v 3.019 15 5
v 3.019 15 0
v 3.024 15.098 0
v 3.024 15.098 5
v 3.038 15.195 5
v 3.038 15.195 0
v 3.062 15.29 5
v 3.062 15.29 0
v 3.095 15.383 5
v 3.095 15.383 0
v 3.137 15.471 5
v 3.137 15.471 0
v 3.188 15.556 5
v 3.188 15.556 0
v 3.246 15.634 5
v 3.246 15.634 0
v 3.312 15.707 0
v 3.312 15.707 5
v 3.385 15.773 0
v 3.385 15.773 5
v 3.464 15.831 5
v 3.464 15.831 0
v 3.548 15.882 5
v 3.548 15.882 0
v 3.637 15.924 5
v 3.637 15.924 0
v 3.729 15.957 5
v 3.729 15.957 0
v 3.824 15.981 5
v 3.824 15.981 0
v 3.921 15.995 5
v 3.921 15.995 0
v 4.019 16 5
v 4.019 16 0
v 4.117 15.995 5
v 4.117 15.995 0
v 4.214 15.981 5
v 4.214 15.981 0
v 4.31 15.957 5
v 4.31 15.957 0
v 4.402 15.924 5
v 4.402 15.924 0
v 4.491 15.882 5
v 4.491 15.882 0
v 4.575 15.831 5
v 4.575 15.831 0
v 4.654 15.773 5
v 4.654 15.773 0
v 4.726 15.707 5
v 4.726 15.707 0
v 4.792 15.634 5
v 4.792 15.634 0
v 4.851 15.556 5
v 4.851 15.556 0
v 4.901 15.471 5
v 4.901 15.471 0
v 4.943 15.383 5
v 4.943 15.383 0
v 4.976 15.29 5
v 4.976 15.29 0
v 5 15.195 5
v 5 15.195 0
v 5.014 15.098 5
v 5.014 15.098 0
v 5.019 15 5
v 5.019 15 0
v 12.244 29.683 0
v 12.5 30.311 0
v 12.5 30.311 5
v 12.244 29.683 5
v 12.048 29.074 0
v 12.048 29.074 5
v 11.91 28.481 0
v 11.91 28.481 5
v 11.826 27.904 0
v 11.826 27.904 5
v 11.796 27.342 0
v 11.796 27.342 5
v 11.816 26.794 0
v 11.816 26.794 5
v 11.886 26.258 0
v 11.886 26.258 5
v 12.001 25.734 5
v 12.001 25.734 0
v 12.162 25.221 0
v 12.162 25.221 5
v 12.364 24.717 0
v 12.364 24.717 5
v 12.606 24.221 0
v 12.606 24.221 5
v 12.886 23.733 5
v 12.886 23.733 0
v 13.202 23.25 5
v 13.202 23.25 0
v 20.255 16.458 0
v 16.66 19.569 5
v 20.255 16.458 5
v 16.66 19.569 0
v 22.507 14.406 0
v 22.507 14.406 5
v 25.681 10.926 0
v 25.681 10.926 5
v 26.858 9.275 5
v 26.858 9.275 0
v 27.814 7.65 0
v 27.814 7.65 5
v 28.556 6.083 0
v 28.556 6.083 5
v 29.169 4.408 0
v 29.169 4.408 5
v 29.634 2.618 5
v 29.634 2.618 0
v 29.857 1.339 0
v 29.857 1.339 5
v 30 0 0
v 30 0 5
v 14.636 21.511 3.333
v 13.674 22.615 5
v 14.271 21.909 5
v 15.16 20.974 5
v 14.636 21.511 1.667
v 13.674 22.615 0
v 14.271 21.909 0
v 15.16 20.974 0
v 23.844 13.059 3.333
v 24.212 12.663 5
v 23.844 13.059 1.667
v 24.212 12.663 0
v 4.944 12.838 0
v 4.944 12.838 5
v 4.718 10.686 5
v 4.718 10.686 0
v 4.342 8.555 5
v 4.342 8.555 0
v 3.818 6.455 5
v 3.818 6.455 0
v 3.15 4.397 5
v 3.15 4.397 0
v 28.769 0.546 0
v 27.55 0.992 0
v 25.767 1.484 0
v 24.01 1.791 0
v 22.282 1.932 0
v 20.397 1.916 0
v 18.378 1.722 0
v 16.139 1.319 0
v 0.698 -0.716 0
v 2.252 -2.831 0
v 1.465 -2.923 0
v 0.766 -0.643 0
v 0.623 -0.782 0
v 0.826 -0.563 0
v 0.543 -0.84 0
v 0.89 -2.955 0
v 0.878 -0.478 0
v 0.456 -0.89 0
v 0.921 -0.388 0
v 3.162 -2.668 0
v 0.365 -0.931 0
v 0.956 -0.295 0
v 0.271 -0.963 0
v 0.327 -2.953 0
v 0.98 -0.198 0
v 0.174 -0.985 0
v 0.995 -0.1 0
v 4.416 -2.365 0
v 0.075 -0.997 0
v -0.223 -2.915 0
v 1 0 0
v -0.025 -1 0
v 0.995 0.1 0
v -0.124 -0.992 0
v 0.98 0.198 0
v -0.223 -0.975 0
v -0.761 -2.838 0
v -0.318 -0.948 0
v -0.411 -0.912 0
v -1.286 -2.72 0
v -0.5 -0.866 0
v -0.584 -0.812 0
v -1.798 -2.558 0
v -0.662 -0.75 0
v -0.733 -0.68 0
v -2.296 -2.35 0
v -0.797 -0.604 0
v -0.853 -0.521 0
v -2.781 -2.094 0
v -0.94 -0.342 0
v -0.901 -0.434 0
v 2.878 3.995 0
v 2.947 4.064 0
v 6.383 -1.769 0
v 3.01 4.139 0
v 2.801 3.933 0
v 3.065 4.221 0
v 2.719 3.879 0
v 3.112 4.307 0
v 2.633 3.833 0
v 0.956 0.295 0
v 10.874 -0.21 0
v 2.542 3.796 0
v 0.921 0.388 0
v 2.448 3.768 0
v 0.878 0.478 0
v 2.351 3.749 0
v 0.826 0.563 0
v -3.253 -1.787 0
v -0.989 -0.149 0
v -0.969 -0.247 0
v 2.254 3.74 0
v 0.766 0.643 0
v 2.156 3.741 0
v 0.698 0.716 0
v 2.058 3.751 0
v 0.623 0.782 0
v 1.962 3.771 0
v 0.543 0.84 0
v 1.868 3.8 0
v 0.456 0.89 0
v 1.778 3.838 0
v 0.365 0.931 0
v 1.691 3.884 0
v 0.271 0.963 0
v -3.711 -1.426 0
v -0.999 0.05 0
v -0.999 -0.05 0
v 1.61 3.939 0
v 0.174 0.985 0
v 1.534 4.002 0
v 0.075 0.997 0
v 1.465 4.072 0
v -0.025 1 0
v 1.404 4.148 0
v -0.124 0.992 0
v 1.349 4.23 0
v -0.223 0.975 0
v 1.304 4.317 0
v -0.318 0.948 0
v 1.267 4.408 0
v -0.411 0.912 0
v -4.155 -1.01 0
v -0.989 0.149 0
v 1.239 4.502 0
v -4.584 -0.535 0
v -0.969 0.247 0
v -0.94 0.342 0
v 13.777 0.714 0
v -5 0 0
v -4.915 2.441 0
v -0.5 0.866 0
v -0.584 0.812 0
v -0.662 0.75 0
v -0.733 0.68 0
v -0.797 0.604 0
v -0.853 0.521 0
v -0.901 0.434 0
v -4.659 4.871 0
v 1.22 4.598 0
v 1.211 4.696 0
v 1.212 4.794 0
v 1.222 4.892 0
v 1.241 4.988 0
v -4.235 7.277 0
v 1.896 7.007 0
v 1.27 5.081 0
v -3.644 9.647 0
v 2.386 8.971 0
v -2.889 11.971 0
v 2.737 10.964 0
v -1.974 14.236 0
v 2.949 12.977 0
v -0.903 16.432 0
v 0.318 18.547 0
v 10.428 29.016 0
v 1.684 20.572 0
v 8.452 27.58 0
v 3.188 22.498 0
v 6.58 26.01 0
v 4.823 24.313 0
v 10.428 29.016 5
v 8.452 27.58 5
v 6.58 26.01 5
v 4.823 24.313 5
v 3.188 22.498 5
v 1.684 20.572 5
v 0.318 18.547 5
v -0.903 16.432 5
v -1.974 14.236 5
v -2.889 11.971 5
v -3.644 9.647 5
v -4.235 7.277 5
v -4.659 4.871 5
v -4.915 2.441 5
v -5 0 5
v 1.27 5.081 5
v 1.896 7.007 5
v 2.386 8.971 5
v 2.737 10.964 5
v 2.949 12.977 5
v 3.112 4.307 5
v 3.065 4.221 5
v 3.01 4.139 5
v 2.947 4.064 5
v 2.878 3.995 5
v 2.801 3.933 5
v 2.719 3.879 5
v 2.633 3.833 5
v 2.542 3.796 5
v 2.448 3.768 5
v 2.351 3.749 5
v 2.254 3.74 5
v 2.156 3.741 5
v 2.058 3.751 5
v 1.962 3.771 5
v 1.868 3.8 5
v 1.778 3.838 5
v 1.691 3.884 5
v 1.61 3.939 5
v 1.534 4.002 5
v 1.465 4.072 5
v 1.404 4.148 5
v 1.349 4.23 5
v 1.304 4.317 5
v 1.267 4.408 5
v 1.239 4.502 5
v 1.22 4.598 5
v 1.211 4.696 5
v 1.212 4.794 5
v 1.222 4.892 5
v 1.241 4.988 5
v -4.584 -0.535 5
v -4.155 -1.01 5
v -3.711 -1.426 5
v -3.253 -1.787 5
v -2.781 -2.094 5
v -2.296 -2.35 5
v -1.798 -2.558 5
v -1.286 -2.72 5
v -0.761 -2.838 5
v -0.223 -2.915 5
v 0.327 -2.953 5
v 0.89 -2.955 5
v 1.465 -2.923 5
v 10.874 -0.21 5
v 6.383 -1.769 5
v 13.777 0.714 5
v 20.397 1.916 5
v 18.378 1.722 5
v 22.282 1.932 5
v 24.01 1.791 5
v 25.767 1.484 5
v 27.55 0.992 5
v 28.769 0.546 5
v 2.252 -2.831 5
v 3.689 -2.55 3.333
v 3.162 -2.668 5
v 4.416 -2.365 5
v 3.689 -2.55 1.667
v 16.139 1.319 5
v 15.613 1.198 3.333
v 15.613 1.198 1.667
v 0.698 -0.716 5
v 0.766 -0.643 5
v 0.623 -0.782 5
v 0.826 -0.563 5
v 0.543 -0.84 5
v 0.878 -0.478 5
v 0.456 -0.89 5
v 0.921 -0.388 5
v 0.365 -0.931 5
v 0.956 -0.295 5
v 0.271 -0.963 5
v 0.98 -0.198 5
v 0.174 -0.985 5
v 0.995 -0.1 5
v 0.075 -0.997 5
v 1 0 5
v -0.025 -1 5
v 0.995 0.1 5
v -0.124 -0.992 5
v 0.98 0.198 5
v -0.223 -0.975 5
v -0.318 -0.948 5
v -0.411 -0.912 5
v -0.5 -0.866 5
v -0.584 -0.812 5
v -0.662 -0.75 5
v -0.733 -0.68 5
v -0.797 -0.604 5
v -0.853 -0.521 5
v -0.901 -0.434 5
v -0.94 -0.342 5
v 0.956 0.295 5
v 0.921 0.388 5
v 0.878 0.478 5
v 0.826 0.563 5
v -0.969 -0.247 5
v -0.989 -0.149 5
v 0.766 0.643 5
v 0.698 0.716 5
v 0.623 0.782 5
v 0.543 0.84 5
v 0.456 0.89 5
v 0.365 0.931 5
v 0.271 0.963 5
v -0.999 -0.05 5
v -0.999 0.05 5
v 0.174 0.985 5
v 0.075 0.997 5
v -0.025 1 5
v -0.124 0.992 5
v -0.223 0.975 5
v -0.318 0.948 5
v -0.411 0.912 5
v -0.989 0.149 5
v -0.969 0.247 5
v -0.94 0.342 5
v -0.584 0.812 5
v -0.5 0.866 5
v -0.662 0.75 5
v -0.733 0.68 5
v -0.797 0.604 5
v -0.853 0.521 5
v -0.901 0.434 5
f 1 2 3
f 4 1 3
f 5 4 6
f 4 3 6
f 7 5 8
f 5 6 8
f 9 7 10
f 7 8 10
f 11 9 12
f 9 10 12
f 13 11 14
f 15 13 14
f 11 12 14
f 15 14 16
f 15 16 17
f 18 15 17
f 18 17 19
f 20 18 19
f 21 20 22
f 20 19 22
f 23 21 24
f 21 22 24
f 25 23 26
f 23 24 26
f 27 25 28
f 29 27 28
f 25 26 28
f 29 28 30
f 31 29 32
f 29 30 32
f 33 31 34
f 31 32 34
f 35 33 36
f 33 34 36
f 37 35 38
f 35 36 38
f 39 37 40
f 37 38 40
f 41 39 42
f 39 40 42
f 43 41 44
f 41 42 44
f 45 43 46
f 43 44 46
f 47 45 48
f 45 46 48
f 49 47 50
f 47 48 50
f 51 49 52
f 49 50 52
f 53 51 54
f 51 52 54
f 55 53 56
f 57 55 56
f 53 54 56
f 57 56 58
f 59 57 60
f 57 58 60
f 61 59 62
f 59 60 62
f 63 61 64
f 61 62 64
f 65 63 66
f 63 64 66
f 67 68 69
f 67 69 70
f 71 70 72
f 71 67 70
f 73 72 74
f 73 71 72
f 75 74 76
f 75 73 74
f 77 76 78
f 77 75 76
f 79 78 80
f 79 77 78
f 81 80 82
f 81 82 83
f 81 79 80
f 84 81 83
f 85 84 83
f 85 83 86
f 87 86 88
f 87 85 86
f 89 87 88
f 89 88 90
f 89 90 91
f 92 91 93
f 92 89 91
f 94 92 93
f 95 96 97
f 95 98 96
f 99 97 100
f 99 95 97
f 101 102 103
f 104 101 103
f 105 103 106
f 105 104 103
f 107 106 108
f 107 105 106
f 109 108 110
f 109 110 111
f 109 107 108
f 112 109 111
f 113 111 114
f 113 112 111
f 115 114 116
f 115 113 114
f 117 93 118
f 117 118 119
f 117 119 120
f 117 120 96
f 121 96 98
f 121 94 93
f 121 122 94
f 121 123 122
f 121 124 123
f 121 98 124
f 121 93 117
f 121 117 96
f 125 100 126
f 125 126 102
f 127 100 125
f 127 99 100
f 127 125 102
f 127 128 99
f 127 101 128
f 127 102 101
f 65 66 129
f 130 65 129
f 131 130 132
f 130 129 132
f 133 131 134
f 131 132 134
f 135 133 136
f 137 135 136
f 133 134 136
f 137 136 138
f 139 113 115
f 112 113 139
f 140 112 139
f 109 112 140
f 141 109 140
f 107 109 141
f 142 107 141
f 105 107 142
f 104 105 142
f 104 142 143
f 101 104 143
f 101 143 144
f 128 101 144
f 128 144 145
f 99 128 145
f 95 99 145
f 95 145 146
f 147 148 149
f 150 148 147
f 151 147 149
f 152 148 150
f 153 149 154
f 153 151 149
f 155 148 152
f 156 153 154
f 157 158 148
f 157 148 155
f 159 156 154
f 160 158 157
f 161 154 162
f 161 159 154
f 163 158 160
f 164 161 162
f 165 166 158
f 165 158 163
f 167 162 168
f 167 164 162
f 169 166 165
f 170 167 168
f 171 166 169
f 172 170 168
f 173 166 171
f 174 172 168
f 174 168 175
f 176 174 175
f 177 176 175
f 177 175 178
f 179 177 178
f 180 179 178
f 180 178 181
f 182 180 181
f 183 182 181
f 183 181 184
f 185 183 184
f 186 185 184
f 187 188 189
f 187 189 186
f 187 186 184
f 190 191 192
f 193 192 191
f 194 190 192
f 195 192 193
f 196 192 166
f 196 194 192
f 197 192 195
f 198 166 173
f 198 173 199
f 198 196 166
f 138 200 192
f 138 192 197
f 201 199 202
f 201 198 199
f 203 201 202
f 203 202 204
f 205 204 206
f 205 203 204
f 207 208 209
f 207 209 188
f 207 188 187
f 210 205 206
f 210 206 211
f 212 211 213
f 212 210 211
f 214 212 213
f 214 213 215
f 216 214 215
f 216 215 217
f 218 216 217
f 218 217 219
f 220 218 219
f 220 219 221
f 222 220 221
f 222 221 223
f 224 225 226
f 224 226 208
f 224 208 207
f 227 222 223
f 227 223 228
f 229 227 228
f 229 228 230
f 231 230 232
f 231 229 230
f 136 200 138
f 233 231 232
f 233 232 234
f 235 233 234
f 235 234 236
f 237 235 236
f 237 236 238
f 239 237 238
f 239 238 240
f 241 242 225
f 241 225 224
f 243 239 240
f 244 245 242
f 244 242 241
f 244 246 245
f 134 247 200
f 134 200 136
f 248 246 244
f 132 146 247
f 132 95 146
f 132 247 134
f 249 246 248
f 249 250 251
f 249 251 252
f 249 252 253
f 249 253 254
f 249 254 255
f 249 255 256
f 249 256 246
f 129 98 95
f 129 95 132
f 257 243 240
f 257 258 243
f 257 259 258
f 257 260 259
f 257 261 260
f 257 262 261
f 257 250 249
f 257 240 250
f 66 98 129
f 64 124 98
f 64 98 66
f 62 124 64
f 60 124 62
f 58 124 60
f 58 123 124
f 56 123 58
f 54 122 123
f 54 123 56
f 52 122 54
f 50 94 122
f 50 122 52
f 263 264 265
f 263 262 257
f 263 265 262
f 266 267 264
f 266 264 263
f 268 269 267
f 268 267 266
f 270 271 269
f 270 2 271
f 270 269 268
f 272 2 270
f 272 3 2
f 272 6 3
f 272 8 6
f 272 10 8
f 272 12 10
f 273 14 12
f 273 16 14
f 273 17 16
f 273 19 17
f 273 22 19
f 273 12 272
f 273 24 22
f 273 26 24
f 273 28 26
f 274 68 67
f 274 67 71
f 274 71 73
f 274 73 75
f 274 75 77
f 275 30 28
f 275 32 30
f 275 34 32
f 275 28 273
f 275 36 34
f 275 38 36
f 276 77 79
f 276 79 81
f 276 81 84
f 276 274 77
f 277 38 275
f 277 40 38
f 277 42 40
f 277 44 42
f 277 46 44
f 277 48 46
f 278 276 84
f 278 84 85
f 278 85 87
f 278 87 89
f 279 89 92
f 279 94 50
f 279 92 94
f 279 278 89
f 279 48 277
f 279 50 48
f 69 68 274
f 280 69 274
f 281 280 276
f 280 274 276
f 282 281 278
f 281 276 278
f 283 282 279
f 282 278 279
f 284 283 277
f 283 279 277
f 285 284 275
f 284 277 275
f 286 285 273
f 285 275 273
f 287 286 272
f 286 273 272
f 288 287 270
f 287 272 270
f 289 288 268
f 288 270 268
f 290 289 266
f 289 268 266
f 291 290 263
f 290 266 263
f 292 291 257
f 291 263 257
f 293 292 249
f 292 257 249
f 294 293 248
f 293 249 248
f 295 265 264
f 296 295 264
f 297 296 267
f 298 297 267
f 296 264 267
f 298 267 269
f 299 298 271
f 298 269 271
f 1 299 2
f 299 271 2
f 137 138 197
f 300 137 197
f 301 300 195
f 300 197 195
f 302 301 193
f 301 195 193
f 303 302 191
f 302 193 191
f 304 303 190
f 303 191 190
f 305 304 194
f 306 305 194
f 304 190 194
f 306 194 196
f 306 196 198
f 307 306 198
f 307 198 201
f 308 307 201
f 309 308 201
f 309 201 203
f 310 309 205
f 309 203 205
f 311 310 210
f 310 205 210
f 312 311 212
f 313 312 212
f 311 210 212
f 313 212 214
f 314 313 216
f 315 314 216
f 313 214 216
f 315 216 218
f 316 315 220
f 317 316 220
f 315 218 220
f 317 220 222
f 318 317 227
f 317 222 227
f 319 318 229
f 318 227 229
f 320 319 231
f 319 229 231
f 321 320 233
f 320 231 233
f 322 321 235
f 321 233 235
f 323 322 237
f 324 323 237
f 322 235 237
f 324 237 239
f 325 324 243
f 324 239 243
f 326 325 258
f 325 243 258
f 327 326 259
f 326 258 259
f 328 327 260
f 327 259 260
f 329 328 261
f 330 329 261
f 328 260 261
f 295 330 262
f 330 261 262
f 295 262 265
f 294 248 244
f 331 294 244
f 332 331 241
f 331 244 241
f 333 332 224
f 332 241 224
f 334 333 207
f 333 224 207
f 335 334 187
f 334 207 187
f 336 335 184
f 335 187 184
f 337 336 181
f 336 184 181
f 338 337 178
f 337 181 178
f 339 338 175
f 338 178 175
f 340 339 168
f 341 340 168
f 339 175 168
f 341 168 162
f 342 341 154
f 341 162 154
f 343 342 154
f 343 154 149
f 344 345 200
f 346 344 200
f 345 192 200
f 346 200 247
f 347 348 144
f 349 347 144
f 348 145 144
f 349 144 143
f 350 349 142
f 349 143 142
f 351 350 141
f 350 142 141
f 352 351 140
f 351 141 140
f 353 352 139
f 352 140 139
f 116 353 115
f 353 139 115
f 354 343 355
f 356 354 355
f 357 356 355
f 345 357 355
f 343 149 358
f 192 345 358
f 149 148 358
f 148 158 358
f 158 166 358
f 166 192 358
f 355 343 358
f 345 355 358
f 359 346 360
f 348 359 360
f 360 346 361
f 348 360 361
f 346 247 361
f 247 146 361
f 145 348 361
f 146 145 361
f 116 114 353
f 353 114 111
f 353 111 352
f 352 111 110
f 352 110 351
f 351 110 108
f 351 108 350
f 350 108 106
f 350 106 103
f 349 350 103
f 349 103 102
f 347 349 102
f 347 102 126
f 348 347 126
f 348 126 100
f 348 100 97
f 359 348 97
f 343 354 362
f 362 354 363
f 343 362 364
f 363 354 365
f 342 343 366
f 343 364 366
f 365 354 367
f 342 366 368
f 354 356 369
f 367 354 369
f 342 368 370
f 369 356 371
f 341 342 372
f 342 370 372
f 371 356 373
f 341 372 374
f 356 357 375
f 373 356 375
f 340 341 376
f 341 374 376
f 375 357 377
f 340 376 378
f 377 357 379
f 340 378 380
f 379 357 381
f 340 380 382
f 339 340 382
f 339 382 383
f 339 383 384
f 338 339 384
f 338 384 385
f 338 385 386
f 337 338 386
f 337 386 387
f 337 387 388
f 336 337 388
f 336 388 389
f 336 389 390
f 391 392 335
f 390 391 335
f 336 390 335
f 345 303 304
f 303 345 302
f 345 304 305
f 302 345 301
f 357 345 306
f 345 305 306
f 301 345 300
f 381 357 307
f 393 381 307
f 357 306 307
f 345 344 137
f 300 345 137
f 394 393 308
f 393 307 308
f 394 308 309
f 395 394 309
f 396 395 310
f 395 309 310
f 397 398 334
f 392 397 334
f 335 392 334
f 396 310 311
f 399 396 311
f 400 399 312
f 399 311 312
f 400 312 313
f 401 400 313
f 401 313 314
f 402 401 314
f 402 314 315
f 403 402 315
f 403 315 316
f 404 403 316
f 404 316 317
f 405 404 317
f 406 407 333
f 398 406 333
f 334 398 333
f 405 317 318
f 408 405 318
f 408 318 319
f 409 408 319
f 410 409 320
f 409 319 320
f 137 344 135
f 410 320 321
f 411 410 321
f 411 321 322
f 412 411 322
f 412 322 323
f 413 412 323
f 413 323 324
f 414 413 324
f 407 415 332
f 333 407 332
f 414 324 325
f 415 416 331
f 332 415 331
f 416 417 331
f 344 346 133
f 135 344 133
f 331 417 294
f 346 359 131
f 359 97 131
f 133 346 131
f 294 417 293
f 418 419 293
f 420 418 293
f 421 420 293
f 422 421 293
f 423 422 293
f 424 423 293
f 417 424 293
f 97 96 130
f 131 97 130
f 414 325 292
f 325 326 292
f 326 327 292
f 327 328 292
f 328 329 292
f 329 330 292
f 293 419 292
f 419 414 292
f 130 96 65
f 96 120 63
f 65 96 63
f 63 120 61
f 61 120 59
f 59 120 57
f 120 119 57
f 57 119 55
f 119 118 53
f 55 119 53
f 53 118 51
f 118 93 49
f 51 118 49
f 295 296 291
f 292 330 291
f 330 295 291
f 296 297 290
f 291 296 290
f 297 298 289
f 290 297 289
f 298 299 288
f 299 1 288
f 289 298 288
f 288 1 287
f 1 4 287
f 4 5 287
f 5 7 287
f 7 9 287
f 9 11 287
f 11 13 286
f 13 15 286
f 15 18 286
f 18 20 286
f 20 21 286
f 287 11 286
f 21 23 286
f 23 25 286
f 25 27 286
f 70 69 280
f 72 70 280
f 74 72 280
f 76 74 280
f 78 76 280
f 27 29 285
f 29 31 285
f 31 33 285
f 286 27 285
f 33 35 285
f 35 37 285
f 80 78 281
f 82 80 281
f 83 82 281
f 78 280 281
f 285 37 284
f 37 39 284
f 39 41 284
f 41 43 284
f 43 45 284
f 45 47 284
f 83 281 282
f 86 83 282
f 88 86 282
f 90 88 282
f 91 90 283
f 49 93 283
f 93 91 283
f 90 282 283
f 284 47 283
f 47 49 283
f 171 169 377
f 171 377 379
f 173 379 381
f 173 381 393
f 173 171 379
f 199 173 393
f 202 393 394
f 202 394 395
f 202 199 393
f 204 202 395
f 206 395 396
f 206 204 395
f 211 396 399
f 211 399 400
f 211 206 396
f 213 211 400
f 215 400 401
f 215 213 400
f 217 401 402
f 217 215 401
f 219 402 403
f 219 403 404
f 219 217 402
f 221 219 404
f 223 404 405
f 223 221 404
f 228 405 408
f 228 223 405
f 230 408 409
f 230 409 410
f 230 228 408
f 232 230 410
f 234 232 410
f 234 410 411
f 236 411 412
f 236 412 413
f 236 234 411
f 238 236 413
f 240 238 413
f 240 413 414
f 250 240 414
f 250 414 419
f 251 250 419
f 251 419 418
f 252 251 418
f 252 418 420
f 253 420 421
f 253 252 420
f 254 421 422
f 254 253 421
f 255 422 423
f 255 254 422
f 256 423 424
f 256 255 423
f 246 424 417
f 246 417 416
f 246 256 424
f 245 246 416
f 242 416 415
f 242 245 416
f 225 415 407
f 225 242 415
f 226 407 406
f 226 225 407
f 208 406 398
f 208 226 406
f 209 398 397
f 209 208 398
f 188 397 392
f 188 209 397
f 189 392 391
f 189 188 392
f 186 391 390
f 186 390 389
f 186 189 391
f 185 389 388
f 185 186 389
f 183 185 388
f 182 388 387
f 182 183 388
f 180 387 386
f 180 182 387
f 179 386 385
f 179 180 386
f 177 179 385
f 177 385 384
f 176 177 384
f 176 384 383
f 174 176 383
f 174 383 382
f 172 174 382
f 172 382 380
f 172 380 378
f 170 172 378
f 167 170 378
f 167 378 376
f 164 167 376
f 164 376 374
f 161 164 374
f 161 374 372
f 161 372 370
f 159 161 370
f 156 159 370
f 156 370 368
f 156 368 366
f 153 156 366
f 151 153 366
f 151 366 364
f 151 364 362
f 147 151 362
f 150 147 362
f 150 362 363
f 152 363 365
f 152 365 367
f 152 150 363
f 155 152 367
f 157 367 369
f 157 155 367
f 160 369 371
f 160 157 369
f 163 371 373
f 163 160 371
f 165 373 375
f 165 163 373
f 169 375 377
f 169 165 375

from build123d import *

# Parameters (mm, degrees)
F0_R     = 1
F1_DEPTH = 5


# Not quite as in the source:
# - ends of sketch curves that miss each other by under 0.0002 mm in the source are joined


with BuildPart() as f1:
    # F0 (on Top) → F1 (new body)
    with BuildSketch(Plane.XY):
        with BuildLine():
            add(Edge.make_bspline(
                [(12.5000001863, 30.3108888098), (7.72521306, 19.685755152), (28.7444061302, 17.0137217111), (30.0000001863, -3.226e-07)],
                knots=[0, 0, 0, 0, 35, 35, 35, 35], degree=3))
            ThreePointArc((12.5000001863, 30.3108888098), (-0.3108891325, 17.5), (-5, 0))
            add(Edge.make_bspline(
                [(-5, 0), (1.8142421031, -9.4476537779), (14.6378874779, 7.4194846675), (30.0000001863, -3.226e-07)],
                knots=[0, 0, 0, 0, 35, 35, 35, 35], degree=3))
        make_face()
        Circle(F0_R, mode=Mode.SUBTRACT)
        with BuildLine():
            ThreePointArc((3.1497091277, 4.3973755592), (1.867996364, 3.7997030808), (1.2703238856, 5.0814158445))
            ThreePointArc((1.2703238856, 5.0814158445), (2.5786627167, 9.9642028495), (3.0192378757, 15.0000000022))
            ThreePointArc((3.0192378757, 15.0000000022), (4.019237875, 16.0000000029), (5.0192378757, 15.0000000036))
            ThreePointArc((5.0192378757, 15.0000000036), (4.548278223, 9.6169064956), (3.1497091277, 4.3973755592))
        make_face(mode=Mode.SUBTRACT)
    extrude(amount=F1_DEPTH)


solid = f1.part
